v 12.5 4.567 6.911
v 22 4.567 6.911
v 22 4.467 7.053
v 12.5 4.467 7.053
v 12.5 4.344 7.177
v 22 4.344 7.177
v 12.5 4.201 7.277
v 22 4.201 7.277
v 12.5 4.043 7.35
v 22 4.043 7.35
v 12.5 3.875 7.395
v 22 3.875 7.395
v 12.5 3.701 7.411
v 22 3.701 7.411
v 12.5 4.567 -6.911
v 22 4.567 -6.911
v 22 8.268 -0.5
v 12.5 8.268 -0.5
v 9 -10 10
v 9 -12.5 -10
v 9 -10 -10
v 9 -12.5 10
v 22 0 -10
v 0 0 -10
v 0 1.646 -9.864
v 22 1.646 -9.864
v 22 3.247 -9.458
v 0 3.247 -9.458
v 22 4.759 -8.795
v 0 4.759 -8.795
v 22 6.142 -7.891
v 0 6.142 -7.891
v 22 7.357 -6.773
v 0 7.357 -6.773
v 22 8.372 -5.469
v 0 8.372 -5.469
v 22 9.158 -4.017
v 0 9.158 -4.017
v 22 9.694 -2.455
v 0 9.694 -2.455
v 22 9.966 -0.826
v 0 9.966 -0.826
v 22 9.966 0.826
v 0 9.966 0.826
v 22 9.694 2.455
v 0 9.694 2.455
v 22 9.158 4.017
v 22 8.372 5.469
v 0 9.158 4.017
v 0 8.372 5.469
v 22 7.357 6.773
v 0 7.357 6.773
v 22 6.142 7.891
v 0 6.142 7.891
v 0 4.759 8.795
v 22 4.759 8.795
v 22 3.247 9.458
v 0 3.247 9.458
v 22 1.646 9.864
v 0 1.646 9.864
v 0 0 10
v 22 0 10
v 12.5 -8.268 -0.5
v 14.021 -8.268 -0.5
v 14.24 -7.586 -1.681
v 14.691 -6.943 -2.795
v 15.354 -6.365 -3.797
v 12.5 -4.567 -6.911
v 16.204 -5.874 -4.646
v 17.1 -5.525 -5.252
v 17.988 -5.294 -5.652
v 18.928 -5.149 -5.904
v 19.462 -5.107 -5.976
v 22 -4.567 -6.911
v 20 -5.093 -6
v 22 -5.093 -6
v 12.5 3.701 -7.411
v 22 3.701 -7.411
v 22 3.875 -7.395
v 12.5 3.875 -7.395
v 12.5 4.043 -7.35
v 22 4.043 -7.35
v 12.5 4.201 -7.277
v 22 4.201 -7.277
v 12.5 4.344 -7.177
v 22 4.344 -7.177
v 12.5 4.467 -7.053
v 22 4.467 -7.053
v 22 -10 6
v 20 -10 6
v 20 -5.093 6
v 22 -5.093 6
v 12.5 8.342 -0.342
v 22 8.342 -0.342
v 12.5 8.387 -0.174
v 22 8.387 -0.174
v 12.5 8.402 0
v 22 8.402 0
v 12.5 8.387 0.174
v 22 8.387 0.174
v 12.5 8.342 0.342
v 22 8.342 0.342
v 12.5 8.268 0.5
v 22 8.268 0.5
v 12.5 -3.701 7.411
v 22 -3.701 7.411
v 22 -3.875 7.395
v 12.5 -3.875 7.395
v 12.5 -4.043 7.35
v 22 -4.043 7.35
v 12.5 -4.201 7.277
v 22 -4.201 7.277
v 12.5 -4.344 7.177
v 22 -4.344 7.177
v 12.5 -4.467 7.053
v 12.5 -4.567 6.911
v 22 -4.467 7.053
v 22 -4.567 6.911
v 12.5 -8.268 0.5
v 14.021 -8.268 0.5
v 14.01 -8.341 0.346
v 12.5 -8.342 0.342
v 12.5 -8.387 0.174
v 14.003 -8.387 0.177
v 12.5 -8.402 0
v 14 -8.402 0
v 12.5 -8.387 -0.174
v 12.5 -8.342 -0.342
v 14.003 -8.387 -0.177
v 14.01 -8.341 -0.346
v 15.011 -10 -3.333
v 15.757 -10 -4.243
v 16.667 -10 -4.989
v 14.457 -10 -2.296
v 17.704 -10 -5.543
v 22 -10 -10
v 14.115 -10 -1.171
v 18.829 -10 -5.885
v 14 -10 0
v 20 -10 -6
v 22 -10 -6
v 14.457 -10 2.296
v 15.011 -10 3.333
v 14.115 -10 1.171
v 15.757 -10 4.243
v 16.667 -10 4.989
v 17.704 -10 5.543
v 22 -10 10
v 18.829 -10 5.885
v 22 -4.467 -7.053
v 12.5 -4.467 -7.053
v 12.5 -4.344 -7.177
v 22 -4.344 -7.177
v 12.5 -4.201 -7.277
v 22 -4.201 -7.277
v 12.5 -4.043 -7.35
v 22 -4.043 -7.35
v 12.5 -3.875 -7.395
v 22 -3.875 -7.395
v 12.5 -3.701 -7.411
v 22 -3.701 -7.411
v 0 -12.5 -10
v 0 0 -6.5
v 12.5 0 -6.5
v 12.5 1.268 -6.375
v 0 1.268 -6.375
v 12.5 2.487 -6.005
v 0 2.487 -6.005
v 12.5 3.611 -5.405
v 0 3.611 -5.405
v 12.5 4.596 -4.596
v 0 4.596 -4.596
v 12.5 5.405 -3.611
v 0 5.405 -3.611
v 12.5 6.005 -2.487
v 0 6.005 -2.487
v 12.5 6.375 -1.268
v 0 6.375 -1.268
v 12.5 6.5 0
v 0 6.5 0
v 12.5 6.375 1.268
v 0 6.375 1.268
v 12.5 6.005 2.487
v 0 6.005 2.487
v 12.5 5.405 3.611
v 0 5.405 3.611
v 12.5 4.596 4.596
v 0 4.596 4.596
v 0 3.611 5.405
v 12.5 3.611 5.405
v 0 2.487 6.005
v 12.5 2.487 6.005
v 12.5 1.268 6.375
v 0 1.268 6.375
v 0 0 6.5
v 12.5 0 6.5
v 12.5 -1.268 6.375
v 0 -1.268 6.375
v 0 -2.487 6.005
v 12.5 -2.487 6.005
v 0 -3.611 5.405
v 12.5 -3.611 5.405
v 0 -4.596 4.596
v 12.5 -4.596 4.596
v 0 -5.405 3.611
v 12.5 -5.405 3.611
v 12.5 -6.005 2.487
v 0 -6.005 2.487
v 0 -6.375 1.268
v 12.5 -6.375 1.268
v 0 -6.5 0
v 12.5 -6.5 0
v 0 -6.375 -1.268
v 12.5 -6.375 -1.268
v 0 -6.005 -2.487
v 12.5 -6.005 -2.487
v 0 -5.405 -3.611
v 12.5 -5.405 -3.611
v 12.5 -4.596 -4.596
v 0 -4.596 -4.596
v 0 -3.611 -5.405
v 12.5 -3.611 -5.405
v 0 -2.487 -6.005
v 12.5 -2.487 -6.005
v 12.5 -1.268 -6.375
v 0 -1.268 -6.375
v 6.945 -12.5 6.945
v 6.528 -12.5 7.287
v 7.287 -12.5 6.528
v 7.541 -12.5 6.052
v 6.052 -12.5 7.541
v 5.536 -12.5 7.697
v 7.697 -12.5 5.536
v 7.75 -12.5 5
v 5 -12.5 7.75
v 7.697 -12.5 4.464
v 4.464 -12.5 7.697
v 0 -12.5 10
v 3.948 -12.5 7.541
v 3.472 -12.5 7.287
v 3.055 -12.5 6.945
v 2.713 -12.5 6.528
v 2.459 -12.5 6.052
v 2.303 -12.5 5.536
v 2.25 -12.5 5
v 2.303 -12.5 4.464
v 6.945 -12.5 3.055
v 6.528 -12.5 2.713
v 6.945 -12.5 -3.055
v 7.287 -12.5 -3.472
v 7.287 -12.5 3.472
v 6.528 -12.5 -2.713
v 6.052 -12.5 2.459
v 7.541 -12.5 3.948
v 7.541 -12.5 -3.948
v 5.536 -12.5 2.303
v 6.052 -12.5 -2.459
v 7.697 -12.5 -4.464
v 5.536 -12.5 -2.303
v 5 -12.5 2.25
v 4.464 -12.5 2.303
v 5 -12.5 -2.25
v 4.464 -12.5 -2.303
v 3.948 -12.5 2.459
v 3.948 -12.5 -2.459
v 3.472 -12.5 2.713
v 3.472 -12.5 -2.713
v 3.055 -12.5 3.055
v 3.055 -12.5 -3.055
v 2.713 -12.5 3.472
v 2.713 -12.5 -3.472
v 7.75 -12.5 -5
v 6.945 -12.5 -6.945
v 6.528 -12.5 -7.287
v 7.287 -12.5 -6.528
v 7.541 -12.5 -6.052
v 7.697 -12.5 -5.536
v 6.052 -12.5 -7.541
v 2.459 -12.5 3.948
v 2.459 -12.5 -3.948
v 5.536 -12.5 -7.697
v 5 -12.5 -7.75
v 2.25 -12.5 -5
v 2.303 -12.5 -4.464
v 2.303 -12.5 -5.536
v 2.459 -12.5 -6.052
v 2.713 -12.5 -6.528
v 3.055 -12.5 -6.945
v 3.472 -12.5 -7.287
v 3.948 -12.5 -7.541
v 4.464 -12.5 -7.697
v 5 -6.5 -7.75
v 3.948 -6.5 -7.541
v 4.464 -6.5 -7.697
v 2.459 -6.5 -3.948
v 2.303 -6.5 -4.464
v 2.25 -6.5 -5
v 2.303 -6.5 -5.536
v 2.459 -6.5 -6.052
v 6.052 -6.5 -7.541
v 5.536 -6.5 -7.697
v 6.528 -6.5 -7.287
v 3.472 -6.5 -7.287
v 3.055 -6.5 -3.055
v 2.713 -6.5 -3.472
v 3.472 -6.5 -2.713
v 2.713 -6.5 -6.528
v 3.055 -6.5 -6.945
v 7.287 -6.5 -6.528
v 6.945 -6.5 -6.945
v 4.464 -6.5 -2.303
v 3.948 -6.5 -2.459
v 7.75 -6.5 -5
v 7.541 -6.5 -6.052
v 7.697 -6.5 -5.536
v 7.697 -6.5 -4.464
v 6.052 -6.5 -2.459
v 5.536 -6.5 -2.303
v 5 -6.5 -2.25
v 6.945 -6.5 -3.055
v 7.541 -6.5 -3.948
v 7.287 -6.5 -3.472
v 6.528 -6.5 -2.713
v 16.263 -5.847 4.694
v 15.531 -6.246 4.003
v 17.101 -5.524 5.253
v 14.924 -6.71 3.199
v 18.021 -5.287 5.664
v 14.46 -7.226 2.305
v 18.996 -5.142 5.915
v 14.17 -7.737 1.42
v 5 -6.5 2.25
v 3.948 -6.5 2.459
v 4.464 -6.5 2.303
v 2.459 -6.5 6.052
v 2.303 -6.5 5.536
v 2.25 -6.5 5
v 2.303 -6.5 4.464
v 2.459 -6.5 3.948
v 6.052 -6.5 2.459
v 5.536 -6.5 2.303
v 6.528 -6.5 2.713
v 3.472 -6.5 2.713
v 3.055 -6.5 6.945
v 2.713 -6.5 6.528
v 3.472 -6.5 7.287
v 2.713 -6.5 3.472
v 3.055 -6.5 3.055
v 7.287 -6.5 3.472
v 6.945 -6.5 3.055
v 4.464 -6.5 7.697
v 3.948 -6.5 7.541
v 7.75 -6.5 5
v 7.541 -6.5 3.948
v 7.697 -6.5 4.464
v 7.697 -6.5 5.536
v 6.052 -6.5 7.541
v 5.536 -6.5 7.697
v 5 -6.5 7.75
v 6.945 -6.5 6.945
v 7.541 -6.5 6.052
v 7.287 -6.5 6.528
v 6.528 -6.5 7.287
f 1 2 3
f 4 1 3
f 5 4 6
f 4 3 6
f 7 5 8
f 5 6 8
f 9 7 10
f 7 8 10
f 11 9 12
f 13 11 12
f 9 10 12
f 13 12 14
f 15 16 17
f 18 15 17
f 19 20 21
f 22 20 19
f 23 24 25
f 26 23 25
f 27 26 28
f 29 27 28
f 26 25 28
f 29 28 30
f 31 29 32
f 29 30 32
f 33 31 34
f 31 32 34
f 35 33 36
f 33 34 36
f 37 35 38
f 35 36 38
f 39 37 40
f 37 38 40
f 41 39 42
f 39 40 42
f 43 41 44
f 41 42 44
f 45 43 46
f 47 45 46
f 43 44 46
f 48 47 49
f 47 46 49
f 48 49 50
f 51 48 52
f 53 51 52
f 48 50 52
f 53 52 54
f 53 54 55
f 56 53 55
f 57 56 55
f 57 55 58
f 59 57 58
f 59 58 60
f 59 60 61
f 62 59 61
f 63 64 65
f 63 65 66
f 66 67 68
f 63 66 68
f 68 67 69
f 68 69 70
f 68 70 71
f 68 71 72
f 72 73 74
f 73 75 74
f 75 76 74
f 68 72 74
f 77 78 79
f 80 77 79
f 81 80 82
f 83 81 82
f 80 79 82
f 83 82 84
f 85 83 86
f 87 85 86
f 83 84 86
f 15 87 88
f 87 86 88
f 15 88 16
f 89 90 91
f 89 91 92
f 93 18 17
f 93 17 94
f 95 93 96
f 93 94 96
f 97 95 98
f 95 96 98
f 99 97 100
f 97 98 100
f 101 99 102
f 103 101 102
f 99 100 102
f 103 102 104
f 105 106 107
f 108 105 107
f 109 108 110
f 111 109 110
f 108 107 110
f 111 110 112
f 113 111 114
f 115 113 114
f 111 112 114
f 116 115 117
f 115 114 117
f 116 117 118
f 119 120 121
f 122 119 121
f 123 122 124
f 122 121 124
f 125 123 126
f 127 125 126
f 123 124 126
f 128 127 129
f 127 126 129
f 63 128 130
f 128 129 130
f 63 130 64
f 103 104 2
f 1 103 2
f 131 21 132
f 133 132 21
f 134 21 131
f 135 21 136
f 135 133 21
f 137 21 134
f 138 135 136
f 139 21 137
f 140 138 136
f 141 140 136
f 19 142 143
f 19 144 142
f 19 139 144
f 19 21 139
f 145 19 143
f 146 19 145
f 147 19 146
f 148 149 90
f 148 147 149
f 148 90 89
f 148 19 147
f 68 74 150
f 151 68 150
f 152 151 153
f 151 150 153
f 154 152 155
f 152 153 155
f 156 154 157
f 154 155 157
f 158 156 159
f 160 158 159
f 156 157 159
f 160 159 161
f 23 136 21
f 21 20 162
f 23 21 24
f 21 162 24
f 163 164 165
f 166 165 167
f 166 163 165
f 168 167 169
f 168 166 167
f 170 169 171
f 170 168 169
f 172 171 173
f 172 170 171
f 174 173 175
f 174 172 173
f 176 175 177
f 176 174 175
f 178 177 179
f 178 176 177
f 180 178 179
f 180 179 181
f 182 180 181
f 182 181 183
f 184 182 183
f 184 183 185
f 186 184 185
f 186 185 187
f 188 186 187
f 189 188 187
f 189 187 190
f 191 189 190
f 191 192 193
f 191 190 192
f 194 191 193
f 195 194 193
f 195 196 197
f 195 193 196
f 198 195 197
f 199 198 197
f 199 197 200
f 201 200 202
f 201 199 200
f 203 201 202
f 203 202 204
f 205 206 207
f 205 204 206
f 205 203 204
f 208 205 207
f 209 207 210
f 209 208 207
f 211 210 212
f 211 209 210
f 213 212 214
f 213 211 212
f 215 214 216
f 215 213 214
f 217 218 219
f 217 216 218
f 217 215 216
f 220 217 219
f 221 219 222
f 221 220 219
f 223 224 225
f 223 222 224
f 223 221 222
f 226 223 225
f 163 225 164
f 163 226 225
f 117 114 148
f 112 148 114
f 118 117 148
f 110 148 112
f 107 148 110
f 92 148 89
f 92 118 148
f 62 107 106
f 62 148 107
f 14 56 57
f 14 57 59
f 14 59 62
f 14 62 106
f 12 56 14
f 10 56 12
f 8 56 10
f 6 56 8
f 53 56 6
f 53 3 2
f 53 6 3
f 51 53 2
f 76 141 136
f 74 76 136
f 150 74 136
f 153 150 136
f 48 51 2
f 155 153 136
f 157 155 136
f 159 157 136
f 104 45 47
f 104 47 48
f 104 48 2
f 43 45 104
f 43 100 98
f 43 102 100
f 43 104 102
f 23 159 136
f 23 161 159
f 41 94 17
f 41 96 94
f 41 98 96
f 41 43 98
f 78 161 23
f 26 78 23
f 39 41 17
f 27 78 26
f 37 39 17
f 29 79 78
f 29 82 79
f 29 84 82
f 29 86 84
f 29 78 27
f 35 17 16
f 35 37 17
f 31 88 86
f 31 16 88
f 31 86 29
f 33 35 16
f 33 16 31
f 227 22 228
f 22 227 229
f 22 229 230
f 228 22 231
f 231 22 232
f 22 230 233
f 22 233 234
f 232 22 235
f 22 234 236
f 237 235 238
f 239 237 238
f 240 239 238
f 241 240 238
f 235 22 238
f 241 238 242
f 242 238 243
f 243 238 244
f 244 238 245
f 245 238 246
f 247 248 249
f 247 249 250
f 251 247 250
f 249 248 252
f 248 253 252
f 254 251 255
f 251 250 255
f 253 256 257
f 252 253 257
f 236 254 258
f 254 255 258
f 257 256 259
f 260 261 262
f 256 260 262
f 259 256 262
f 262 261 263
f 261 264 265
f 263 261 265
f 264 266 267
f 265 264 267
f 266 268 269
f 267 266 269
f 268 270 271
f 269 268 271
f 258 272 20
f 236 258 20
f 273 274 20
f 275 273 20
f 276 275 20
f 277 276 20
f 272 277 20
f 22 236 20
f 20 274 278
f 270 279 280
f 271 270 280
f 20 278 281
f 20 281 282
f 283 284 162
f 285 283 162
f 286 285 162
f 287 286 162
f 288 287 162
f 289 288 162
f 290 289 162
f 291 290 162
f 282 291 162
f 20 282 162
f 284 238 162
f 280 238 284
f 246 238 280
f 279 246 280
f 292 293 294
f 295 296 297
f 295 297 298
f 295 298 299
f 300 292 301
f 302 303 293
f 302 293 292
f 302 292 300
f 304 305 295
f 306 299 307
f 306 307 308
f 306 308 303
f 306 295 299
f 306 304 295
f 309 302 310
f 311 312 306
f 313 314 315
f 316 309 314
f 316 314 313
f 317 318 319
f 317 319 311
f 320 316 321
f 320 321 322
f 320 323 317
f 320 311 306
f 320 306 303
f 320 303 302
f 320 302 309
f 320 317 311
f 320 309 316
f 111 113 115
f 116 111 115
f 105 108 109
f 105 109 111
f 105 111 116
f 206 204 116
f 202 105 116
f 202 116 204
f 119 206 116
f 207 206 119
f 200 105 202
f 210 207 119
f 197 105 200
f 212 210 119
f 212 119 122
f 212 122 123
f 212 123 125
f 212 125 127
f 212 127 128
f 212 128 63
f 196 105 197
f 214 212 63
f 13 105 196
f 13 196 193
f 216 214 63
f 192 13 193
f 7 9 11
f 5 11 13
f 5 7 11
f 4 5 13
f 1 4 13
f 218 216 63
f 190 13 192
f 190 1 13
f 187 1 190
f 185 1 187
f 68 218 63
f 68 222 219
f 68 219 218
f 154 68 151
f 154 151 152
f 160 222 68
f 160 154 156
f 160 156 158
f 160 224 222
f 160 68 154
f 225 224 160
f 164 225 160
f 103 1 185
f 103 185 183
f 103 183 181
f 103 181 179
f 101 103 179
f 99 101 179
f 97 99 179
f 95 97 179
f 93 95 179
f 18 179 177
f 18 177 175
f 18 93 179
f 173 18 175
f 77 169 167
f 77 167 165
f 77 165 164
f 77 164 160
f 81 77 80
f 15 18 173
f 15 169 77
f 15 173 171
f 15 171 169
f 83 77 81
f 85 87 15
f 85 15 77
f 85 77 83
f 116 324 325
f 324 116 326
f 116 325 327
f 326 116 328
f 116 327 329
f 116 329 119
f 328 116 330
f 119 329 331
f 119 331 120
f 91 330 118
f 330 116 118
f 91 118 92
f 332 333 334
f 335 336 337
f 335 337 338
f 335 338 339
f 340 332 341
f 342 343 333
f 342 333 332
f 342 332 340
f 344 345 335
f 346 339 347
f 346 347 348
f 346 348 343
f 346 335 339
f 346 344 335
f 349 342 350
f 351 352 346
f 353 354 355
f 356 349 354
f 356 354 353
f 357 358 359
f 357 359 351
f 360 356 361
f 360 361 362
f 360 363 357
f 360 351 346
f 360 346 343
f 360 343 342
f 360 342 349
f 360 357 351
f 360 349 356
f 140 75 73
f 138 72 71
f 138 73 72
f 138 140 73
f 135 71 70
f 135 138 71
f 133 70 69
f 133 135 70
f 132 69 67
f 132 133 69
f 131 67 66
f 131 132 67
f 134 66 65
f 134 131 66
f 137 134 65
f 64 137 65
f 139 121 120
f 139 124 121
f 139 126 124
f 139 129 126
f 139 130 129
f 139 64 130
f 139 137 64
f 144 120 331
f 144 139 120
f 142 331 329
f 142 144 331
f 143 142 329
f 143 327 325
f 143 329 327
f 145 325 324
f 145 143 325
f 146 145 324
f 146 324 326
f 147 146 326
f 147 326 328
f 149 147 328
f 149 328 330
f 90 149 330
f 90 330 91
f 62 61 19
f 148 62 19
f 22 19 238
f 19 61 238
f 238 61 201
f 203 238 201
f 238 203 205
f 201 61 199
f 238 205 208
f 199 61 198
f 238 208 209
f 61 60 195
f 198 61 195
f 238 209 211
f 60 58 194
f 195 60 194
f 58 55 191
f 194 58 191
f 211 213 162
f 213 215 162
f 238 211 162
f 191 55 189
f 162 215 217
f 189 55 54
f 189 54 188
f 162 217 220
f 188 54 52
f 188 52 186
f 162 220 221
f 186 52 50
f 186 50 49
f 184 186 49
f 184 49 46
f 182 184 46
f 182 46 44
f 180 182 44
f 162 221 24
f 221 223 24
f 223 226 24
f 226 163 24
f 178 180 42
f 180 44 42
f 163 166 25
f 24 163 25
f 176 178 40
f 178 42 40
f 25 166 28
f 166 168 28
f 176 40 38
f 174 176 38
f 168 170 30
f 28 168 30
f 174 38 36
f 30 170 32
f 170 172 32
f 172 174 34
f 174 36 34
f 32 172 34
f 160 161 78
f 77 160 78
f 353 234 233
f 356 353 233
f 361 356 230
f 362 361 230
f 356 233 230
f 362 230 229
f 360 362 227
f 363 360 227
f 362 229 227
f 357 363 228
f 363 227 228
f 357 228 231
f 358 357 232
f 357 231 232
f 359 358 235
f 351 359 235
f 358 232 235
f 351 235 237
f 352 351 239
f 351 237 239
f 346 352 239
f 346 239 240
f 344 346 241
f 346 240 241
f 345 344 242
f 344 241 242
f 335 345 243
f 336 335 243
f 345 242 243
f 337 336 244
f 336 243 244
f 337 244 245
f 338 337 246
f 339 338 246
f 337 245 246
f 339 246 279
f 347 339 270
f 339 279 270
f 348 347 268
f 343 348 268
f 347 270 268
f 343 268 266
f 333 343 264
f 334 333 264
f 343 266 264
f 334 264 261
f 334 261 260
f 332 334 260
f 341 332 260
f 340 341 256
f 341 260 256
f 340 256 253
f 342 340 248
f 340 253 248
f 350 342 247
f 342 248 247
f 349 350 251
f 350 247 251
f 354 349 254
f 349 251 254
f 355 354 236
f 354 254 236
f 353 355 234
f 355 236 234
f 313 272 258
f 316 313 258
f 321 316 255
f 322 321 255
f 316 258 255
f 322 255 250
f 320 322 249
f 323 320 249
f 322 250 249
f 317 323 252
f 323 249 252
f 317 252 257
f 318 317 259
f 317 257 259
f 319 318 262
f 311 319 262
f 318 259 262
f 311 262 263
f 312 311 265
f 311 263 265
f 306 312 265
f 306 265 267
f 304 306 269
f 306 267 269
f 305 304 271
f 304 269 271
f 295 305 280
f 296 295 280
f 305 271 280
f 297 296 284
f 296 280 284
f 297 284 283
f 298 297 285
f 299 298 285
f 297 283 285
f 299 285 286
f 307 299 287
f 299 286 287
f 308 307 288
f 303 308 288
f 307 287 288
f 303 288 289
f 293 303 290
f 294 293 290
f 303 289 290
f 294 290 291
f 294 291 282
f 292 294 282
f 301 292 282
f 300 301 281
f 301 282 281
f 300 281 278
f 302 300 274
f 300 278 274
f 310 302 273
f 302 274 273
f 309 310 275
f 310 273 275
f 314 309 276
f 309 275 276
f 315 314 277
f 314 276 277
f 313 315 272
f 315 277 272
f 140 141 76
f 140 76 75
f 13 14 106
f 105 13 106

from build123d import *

# Parameters (mm, degrees)
SKIZZE1_R                       = 6.5
AUFSATZ_LINEAR_AUSTRAGEN1_DEPTH = 22
SCHNITT_LINEAR_AUSTRAGEN1_DEPTH = 9.5
SKIZZE3_R                       = 2.75
SCHNITT_LINEAR_AUSTRAGEN2_DEPTH = 6
SCHNITT_LINEAR_AUSTRAGEN3_REACH = 24.5
SKIZZE5_W                       = 13
SKIZZE5_H                       = 20
SCHNITT_LINEAR_AUSTRAGEN4_DEPTH = 2.5


with BuildPart() as part:
    # Skizze1 → Aufsatz-Linear austragen1 (new body)
    with BuildSketch(Plane(origin=(0, 0, 0), x_dir=(0, 0, -1), z_dir=(1, 0, 0))):
        with BuildLine():
            Line((-10, 0), (-10, -12.5))
            Line((-10, -12.5), (10, -12.5))
            Line((10, -12.5), (10, 0))
            ThreePointArc((10, 0), (0, 10), (-10, 0))
        make_face()
        Circle(SKIZZE1_R, mode=Mode.SUBTRACT)
    extrude(amount=AUFSATZ_LINEAR_AUSTRAGEN1_DEPTH)

    # Skizze2 → Schnitt-Linear austragen1 (cut)
    with BuildSketch(Plane(origin=(22, 0, 0), x_dir=(0, 0, -1), z_dir=(1, 0, 0))):
        with BuildLine():
            Line((7.410637894, -3.701183514), (7.410637894, 3.701183514))
            ThreePointArc((7.410637894, 3.701183514), (7.276663298, 4.201183514), (6.910637894, 4.567208918))
            Line((6.910637894, 4.567208918), (0.5, 8.268392432))
            ThreePointArc((0.5, 8.268392432), (0, 8.402367028), (-0.5, 8.268392432))
            Line((-0.5, 8.268392432), (-6.910637894, 4.567208918))
            ThreePointArc((-6.910637894, 4.567208918), (-7.276663298, 4.201183514), (-7.410637894, 3.701183514))
            Line((-7.410637894, 3.701183514), (-7.410637894, -3.701183514))
            ThreePointArc((-7.410637894, -3.701183514), (-7.276663298, -4.201183514), (-6.910637894, -4.567208918))
            Line((-6.910637894, -4.567208918), (-0.5, -8.268392432))
            ThreePointArc((-0.5, -8.268392432), (0, -8.402367028), (0.5, -8.268392432))
            Line((0.5, -8.268392432), (6.910637894, -4.567208918))
            ThreePointArc((6.910637894, -4.567208918), (7.276663298, -4.201183514), (7.410637894, -3.701183514))
        make_face()
    extrude(amount=-SCHNITT_LINEAR_AUSTRAGEN1_DEPTH, mode=Mode.SUBTRACT)

    # Skizze3 → Schnitt-Linear austragen2 (cut)
    with BuildSketch(Plane.XZ.offset(12.5)):
        with Locations((5, 5)):
            Circle(SKIZZE3_R)
        with Locations((5, -5)):
            Circle(SKIZZE3_R)
    extrude(amount=-SCHNITT_LINEAR_AUSTRAGEN2_DEPTH, mode=Mode.SUBTRACT)

    # Skizze4 → Schnitt-Linear austragen3 (cut, up to next)
    with BuildSketch(Plane.XZ.offset(12.5), mode=Mode.PRIVATE) as schnitt_linear_austragen3_sk1:
        with BuildLine():
            Line((20, 6), (22, 6))
            Line((22, 6), (22, -6))
            Line((22, -6), (20, -6))
            ThreePointArc((20, -6), (14, 0), (20, 6))
        make_face()
    schnitt_linear_austragen3_tool1 = extrude(schnitt_linear_austragen3_sk1.sketch, amount=-SCHNITT_LINEAR_AUSTRAGEN3_REACH, mode=Mode.PRIVATE) & part.part
    add(schnitt_linear_austragen3_tool1.solids().sort_by_distance((18.510217, -12.5, 0))[0], mode=Mode.SUBTRACT)

    # Skizze5 → Schnitt-Linear austragen4 (cut)
    with BuildSketch(Plane.XZ.offset(12.5)):
        with Locations((15.5, 0)):
            Rectangle(SKIZZE5_W, SKIZZE5_H)
    extrude(amount=-SCHNITT_LINEAR_AUSTRAGEN4_DEPTH, mode=Mode.SUBTRACT)


solid = part.part
